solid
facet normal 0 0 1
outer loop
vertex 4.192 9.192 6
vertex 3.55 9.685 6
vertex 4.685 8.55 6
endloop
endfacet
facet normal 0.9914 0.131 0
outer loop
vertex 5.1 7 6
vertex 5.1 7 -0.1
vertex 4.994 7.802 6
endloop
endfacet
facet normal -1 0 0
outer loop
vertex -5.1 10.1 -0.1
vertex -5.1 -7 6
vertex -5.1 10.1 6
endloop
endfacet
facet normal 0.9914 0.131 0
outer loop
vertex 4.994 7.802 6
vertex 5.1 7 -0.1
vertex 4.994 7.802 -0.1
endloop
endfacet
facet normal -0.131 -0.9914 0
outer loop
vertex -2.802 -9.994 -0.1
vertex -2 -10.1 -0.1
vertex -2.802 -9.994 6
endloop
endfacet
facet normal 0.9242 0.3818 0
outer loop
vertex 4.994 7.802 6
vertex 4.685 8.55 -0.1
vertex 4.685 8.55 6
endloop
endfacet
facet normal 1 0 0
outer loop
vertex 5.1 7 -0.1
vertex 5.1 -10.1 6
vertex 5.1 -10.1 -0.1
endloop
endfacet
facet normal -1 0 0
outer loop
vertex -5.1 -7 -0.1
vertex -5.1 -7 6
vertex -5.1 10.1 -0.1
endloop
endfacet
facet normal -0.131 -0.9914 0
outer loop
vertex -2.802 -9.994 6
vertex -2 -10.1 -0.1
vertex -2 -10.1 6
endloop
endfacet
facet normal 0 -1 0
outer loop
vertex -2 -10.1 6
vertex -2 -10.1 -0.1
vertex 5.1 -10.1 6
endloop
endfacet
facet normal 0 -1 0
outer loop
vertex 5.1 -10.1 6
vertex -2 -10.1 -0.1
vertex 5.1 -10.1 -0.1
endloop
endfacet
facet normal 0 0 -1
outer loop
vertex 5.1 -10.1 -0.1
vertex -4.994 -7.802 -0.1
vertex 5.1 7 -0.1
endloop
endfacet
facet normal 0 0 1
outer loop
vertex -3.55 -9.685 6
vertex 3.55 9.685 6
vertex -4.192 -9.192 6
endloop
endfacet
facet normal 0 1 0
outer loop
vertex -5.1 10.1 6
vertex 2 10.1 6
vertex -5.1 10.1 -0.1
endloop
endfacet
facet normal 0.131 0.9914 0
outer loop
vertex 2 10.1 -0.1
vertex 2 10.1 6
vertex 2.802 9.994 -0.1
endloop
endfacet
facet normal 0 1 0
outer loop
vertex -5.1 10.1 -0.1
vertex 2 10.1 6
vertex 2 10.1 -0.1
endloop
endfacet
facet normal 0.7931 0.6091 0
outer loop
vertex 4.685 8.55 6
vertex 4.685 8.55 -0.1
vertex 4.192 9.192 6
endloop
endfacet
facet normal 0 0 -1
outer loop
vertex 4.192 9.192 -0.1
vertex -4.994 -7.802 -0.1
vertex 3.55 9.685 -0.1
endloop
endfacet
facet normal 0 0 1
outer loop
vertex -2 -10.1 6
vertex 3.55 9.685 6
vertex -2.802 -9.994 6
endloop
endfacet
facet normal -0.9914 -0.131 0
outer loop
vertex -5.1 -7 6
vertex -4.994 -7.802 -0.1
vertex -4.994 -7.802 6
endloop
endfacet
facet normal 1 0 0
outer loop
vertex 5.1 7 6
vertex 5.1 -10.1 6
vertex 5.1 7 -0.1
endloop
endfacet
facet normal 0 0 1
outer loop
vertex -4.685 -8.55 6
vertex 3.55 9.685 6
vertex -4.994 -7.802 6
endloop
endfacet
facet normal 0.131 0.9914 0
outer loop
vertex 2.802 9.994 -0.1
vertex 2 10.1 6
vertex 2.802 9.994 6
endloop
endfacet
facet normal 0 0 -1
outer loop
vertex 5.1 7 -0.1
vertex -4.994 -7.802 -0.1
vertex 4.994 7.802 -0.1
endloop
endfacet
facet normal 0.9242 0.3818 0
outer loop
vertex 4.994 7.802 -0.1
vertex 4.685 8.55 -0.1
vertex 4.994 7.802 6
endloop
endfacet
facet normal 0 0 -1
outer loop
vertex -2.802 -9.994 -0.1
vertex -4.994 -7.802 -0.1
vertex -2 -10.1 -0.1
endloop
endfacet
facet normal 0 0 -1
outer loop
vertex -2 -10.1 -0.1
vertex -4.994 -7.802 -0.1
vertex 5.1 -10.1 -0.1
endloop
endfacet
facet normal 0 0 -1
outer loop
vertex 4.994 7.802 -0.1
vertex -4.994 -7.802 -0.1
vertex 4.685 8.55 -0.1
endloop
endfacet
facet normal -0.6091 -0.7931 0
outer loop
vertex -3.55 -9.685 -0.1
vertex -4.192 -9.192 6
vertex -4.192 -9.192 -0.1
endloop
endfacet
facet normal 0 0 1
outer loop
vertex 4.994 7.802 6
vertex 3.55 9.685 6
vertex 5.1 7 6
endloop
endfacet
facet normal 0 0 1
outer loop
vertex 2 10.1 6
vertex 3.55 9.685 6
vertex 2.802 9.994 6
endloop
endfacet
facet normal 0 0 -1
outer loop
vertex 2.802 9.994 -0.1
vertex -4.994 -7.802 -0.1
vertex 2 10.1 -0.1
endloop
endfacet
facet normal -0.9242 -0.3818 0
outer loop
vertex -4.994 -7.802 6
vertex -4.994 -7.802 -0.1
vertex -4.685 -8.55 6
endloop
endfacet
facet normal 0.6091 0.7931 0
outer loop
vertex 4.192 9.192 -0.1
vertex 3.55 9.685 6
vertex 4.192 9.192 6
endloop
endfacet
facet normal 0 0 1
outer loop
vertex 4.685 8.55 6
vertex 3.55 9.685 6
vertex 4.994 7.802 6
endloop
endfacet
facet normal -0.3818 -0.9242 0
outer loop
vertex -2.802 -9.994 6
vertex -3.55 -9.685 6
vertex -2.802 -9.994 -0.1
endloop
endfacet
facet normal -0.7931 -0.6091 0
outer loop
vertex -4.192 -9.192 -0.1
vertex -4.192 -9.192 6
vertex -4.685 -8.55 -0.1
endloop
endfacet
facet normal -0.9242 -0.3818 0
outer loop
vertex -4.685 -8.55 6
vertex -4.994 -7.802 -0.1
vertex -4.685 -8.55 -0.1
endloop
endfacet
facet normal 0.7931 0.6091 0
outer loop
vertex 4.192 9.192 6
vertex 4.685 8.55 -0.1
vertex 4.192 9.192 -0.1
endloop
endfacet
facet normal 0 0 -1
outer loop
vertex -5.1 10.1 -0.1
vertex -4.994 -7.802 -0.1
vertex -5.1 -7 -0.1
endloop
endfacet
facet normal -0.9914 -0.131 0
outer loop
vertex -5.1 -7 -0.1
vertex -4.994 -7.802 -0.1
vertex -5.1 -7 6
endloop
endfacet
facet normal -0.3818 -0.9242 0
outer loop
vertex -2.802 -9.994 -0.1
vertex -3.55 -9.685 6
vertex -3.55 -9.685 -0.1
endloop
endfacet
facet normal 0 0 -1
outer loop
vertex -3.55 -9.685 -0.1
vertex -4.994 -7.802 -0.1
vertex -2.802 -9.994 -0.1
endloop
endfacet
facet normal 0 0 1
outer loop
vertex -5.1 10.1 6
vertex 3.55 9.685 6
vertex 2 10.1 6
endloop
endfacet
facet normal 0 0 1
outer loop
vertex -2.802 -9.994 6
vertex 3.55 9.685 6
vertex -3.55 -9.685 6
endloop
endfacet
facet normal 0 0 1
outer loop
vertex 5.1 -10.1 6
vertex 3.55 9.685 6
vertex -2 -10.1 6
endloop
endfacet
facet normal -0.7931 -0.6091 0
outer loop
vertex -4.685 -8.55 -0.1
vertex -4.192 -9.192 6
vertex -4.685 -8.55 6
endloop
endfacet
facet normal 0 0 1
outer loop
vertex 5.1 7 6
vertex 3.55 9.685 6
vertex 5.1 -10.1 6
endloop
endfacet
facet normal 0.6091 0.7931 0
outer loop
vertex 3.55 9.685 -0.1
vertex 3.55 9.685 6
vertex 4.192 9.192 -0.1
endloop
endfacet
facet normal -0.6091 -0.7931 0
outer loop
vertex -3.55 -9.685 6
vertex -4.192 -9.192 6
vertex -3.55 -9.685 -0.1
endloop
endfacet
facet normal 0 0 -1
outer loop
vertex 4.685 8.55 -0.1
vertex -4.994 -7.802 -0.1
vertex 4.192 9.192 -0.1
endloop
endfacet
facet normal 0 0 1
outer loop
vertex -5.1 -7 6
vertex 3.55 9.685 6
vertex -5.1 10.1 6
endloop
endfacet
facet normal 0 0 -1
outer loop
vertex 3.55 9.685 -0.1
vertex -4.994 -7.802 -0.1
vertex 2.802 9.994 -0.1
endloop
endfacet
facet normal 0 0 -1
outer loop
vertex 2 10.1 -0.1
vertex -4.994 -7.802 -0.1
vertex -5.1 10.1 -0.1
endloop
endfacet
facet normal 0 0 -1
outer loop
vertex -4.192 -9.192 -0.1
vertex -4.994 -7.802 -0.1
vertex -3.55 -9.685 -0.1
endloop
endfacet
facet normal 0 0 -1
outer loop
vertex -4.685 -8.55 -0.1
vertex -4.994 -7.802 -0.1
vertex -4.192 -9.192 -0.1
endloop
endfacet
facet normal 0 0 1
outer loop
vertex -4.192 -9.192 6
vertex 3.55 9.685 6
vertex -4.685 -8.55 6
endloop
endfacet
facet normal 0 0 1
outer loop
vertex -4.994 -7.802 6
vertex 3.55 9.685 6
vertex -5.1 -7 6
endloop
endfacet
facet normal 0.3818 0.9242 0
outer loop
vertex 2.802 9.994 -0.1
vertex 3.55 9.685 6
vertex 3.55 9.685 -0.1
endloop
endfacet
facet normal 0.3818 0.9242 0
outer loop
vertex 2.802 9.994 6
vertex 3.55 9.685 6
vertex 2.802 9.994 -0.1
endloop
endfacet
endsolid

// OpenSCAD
module cube_vround(
	size=[10,10,10],
	round_corners=[true,true,true,true],
	rounding=3,
	center_xy=false,
	center_z=false,
	attach=0,
	wall_attach=0,
	quality=2, //integer from 1 to infinity
)
{
	assert(len(size)==3);
	assert(len(round_corners)==4);
	assert(rounding>0);
	assert(rounding<=size[0]/2);
	assert(rounding<=size[1]/2);
	assert(quality>0);
	assert(attach>=0);
	assert(wall_attach>=0);
	height=size[2]+attach;
	cyl_r=rounding+wall_attach;
	cyl_mvx=size[0]/2-rounding;
	cyl_mvy=size[1]/2-rounding;
	cube_szx=size[0]/2;
	cube_szy=size[1]/2;
	cube_mvx=cube_szx/2+wall_attach;
	cube_mvy=cube_szy/2+wall_attach;
	translate([center_xy?0:cx,center_xy?0:cy,center_z?-attach/2:(size[2]-attach)/2])
		hull()
		{
			if(round_corners[0])
				translate([cyl_mvx,cyl_mvy])
					cylinder(r=cyl_r,h=height,$fn=12*quality,center=true);
			else
				translate([cube_mvx,cube_mvy])
					cube([cube_szx,cube_szy,height],center=true);
			if(round_corners[1])
				translate([cyl_mvx,-cyl_mvy])
					cylinder(r=cyl_r,h=height,$fn=12*quality,center=true);
			else
				translate([cube_mvx,-cube_mvy])
					cube([cube_szx,cube_szy,height],center=true);
			if(round_corners[2])
				translate([-cyl_mvx,-cyl_mvy])
					cylinder(r=cyl_r,h=height,$fn=12*quality,center=true);
			else
				translate([-cube_mvx,-cube_mvy])
					cube([cube_szx,cube_szy,height],center=true);
			if(round_corners[3])
				translate([-cyl_mvx,cyl_mvy])
					cylinder(r=cyl_r,h=height,$fn=12*quality,center=true);
			else
				translate([-cube_mvx,cube_mvy])
					cube([cube_szx,cube_szy,height],center=true);
		};
}

//example
cube_vround(round_corners=[true,false,true,false],
size=[10,20,6],
attach=0.1,
wall_attach=0.1,
rounding=3,
center_xy=true,center_z=false);
